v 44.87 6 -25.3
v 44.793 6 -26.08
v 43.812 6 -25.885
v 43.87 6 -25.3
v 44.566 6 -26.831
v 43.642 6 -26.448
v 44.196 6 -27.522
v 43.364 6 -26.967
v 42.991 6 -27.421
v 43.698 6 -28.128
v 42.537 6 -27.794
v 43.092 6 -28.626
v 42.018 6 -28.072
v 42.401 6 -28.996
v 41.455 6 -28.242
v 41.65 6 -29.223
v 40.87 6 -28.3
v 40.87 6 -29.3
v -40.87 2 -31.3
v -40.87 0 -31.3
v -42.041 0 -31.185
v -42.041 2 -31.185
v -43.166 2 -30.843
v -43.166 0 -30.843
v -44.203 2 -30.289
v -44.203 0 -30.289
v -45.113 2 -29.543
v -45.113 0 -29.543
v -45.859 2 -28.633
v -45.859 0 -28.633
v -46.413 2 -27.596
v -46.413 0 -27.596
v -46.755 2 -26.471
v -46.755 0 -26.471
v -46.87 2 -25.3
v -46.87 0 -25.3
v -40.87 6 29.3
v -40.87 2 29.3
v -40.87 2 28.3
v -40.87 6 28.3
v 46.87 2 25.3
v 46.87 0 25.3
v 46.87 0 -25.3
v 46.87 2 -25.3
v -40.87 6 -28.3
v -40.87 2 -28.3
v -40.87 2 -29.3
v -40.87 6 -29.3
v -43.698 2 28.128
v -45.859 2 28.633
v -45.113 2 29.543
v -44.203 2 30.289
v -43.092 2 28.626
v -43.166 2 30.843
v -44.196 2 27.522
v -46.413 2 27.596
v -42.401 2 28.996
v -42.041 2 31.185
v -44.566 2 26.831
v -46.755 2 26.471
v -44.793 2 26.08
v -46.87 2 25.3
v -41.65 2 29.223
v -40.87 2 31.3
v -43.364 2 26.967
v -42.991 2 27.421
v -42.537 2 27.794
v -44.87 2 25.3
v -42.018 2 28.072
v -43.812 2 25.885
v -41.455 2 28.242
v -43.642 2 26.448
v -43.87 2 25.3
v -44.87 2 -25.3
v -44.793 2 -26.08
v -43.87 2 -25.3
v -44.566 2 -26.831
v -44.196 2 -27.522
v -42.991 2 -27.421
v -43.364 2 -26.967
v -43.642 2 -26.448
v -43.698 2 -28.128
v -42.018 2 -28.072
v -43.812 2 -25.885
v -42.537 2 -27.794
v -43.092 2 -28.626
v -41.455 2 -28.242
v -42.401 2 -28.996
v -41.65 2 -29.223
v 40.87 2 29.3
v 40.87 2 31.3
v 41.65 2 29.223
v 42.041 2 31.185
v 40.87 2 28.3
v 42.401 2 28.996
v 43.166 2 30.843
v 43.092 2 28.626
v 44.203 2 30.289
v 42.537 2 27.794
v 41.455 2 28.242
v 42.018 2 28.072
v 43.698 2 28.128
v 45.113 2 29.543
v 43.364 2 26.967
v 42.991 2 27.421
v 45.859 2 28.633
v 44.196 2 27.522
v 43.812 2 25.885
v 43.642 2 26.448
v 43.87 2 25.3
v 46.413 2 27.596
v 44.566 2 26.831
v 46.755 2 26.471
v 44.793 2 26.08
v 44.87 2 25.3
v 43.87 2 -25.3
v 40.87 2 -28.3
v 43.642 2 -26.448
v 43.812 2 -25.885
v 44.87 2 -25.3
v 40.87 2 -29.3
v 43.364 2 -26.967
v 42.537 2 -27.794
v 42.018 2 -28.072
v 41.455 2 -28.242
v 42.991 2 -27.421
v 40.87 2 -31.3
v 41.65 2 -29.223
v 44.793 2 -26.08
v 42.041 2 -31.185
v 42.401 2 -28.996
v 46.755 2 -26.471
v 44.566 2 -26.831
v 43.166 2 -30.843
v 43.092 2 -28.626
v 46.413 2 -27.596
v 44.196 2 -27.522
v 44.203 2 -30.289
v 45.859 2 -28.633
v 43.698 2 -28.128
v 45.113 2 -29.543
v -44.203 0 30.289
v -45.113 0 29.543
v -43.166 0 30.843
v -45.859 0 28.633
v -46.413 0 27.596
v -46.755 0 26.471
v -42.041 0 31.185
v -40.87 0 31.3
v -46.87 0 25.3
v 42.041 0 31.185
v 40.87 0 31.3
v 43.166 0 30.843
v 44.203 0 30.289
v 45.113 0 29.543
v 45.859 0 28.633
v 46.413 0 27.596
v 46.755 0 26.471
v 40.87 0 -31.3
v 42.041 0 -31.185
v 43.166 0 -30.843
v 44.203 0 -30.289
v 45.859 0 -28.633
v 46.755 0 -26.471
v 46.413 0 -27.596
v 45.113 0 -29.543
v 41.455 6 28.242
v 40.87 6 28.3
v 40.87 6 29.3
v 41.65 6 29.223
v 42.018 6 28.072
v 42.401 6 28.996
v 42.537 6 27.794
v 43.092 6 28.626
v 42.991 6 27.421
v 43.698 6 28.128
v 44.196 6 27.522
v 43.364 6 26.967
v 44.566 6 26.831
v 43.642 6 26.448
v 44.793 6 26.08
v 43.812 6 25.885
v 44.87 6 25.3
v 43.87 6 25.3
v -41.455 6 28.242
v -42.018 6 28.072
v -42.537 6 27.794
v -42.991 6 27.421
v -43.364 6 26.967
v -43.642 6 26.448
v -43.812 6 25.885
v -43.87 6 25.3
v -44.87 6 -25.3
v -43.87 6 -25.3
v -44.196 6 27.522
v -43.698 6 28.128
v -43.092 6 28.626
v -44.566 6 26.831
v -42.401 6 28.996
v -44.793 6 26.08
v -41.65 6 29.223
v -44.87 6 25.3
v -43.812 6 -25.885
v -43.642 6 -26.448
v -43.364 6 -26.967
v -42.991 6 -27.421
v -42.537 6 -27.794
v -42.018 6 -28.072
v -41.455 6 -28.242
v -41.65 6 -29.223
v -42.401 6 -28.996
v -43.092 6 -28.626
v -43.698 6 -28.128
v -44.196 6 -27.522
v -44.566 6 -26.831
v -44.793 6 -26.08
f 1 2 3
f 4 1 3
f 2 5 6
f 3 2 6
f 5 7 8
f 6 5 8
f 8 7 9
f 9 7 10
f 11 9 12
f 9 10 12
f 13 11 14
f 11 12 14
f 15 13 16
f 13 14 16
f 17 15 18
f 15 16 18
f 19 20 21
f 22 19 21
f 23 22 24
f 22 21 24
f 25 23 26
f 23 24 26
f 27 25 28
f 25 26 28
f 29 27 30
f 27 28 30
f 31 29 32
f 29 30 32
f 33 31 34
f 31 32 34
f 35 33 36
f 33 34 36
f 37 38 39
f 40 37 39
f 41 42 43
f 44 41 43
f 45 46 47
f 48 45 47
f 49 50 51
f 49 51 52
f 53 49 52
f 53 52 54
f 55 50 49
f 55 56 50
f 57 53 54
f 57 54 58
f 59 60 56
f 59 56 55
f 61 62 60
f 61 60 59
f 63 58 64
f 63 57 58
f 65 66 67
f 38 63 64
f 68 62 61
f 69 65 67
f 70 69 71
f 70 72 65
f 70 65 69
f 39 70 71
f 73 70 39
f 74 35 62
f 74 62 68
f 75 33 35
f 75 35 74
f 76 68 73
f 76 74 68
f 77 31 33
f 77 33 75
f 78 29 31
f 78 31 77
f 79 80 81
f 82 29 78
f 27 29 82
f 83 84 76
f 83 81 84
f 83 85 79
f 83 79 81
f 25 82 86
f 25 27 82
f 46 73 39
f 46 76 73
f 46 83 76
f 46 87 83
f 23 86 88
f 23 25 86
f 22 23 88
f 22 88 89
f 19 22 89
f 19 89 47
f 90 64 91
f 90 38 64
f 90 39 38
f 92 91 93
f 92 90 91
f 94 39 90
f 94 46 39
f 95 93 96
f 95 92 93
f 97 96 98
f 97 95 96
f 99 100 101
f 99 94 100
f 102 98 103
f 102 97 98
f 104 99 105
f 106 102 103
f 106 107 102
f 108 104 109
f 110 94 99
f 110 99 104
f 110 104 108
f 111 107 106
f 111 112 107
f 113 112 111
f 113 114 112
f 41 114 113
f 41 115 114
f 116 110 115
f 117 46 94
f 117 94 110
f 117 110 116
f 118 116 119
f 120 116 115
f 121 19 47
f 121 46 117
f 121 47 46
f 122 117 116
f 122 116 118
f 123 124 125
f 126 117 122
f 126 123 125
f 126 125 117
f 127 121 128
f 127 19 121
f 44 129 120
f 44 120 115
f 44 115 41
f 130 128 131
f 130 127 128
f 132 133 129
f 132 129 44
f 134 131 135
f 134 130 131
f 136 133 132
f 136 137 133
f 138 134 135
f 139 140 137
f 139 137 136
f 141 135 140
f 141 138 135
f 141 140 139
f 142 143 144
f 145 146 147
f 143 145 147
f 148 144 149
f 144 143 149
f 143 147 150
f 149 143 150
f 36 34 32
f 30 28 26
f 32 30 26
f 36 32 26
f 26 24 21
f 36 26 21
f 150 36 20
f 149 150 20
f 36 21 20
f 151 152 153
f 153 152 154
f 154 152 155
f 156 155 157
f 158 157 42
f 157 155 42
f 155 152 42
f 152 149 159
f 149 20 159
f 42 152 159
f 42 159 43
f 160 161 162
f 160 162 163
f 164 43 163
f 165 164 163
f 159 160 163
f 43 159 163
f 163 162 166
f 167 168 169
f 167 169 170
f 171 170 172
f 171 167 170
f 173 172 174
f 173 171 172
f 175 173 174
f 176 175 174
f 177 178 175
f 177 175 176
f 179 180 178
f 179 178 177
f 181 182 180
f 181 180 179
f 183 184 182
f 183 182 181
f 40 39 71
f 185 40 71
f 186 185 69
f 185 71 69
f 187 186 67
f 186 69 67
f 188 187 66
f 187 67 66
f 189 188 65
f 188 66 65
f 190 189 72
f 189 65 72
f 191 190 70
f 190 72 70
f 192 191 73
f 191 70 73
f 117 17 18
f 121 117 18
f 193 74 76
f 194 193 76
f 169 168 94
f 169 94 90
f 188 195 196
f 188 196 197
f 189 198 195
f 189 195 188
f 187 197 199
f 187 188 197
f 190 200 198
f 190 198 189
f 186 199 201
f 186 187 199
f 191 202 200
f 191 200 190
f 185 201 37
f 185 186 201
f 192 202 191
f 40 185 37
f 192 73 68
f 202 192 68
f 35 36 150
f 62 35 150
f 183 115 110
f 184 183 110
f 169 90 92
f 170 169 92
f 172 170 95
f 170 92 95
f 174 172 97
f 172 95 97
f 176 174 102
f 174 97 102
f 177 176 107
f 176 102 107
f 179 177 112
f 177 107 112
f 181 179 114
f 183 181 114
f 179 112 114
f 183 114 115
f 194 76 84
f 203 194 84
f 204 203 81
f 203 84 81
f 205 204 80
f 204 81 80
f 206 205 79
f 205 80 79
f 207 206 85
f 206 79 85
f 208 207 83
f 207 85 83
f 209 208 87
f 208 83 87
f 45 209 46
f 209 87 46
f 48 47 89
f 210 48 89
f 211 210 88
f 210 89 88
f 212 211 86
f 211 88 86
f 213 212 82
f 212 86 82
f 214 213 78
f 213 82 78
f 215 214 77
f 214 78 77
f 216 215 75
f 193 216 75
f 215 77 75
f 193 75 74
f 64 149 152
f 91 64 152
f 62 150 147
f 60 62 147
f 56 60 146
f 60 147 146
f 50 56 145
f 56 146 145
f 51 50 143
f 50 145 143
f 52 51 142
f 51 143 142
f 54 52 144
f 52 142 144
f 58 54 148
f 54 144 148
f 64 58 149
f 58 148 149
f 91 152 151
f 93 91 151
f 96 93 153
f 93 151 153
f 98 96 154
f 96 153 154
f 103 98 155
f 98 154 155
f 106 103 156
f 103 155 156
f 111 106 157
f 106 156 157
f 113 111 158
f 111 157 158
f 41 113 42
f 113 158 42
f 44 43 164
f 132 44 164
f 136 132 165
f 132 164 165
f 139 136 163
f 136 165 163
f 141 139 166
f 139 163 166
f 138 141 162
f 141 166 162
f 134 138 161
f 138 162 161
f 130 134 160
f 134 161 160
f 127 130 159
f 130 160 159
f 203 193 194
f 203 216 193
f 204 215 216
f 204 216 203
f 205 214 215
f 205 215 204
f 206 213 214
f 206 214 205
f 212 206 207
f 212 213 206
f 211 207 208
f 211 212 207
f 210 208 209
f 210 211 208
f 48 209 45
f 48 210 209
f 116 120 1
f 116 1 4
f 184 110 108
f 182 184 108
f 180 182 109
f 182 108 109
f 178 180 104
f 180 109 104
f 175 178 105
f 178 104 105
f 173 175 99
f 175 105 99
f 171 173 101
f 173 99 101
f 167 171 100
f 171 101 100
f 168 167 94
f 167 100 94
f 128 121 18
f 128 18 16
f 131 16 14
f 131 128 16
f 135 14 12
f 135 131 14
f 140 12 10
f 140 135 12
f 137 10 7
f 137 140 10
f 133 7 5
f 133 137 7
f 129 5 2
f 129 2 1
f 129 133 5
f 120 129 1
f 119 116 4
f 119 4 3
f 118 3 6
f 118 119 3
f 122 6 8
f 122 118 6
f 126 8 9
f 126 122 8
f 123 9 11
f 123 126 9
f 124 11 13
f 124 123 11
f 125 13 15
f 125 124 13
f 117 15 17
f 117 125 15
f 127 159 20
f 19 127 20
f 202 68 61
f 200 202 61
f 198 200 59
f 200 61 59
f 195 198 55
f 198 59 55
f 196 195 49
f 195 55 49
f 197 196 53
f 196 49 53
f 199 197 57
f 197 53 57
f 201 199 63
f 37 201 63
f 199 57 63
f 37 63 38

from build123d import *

# Parameters (mm, degrees)
SALIENTE_EXTRUIR1_DEPTH = 2
SALIENTE_EXTRUIR2_DEPTH = 4


with BuildPart() as part:
    # Croquis1 → Saliente-Extruir1 (new body)
    with BuildSketch(Plane(origin=(0, 0, 0), x_dir=(1, 0, 0), z_dir=(0, 1, 0))):
        with BuildLine():
            Line((-40.87, -31.3), (40.87, -31.3))
            ThreePointArc((40.87, -31.3), (45.112640687, -29.542640687), (46.87, -25.3))
            Line((46.87, -25.3), (46.87, 25.3))
            ThreePointArc((46.87, 25.3), (45.112640687, 29.542640687), (40.87, 31.3))
            Line((40.87, 31.3), (-40.87, 31.3))
            ThreePointArc((-40.87, 31.3), (-45.112640687, 29.542640687), (-46.87, 25.3))
            Line((-46.87, 25.3), (-46.87, -25.3))
            ThreePointArc((-46.87, -25.3), (-45.112640687, -29.542640687), (-40.87, -31.3))
        make_face()
    extrude(amount=SALIENTE_EXTRUIR1_DEPTH)

    # Croquis2 → Saliente-Extruir2 (add)
    with BuildSketch(Plane(origin=(0, 2, 0), x_dir=(1, 0, 0), z_dir=(0, 1, 0))):
        with BuildLine():
            ThreePointArc((43.87, 25.3), (42.991320344, 27.421320344), (40.87, 28.3))
            Line((40.87, 28.3), (40.87, 29.3))
            ThreePointArc((40.87, 29.3), (43.698427125, 28.128427125), (44.87, 25.3))
            Line((44.87, 25.3), (43.87, 25.3))
        make_face()
        with BuildLine():
            Line((-44.87, 25.3), (-44.37, 25.3))
            ThreePointArc((-44.37, 25.3), (-43.344873734, 27.774873734), (-40.87, 28.8))
            Line((-40.87, 28.8), (-40.87, 29.3))
            ThreePointArc((-40.87, 29.3), (-43.698427125, 28.128427125), (-44.87, 25.3))
        make_face()
        with BuildLine():
            Line((-44.37, 25.3), (-43.87, 25.3))
            ThreePointArc((-43.87, 25.3), (-42.991320344, 27.421320344), (-40.87, 28.3))
            Line((-40.87, 28.3), (-40.87, 28.8))
            ThreePointArc((-40.87, 28.8), (-43.344873734, 27.774873734), (-44.37, 25.3))
        make_face()
        with BuildLine():
            ThreePointArc((-44.87, -25.3), (-43.698427125, -28.128427125), (-40.87, -29.3))
            Line((-40.87, -29.3), (-40.87, -28.3))
            ThreePointArc((-40.87, -28.3), (-42.991320344, -27.421320344), (-43.87, -25.3))
            Line((-43.87, -25.3), (-44.87, -25.3))
        make_face()
        with BuildLine():
            ThreePointArc((43.87, -25.3), (42.991320344, -27.421320344), (40.87, -28.3))
            Line((40.87, -28.3), (40.87, -29.3))
            ThreePointArc((40.87, -29.3), (43.698427125, -28.128427125), (44.87, -25.3))
            Line((44.87, -25.3), (43.87, -25.3))
        make_face()
    extrude(amount=SALIENTE_EXTRUIR2_DEPTH)


solid = part.part
